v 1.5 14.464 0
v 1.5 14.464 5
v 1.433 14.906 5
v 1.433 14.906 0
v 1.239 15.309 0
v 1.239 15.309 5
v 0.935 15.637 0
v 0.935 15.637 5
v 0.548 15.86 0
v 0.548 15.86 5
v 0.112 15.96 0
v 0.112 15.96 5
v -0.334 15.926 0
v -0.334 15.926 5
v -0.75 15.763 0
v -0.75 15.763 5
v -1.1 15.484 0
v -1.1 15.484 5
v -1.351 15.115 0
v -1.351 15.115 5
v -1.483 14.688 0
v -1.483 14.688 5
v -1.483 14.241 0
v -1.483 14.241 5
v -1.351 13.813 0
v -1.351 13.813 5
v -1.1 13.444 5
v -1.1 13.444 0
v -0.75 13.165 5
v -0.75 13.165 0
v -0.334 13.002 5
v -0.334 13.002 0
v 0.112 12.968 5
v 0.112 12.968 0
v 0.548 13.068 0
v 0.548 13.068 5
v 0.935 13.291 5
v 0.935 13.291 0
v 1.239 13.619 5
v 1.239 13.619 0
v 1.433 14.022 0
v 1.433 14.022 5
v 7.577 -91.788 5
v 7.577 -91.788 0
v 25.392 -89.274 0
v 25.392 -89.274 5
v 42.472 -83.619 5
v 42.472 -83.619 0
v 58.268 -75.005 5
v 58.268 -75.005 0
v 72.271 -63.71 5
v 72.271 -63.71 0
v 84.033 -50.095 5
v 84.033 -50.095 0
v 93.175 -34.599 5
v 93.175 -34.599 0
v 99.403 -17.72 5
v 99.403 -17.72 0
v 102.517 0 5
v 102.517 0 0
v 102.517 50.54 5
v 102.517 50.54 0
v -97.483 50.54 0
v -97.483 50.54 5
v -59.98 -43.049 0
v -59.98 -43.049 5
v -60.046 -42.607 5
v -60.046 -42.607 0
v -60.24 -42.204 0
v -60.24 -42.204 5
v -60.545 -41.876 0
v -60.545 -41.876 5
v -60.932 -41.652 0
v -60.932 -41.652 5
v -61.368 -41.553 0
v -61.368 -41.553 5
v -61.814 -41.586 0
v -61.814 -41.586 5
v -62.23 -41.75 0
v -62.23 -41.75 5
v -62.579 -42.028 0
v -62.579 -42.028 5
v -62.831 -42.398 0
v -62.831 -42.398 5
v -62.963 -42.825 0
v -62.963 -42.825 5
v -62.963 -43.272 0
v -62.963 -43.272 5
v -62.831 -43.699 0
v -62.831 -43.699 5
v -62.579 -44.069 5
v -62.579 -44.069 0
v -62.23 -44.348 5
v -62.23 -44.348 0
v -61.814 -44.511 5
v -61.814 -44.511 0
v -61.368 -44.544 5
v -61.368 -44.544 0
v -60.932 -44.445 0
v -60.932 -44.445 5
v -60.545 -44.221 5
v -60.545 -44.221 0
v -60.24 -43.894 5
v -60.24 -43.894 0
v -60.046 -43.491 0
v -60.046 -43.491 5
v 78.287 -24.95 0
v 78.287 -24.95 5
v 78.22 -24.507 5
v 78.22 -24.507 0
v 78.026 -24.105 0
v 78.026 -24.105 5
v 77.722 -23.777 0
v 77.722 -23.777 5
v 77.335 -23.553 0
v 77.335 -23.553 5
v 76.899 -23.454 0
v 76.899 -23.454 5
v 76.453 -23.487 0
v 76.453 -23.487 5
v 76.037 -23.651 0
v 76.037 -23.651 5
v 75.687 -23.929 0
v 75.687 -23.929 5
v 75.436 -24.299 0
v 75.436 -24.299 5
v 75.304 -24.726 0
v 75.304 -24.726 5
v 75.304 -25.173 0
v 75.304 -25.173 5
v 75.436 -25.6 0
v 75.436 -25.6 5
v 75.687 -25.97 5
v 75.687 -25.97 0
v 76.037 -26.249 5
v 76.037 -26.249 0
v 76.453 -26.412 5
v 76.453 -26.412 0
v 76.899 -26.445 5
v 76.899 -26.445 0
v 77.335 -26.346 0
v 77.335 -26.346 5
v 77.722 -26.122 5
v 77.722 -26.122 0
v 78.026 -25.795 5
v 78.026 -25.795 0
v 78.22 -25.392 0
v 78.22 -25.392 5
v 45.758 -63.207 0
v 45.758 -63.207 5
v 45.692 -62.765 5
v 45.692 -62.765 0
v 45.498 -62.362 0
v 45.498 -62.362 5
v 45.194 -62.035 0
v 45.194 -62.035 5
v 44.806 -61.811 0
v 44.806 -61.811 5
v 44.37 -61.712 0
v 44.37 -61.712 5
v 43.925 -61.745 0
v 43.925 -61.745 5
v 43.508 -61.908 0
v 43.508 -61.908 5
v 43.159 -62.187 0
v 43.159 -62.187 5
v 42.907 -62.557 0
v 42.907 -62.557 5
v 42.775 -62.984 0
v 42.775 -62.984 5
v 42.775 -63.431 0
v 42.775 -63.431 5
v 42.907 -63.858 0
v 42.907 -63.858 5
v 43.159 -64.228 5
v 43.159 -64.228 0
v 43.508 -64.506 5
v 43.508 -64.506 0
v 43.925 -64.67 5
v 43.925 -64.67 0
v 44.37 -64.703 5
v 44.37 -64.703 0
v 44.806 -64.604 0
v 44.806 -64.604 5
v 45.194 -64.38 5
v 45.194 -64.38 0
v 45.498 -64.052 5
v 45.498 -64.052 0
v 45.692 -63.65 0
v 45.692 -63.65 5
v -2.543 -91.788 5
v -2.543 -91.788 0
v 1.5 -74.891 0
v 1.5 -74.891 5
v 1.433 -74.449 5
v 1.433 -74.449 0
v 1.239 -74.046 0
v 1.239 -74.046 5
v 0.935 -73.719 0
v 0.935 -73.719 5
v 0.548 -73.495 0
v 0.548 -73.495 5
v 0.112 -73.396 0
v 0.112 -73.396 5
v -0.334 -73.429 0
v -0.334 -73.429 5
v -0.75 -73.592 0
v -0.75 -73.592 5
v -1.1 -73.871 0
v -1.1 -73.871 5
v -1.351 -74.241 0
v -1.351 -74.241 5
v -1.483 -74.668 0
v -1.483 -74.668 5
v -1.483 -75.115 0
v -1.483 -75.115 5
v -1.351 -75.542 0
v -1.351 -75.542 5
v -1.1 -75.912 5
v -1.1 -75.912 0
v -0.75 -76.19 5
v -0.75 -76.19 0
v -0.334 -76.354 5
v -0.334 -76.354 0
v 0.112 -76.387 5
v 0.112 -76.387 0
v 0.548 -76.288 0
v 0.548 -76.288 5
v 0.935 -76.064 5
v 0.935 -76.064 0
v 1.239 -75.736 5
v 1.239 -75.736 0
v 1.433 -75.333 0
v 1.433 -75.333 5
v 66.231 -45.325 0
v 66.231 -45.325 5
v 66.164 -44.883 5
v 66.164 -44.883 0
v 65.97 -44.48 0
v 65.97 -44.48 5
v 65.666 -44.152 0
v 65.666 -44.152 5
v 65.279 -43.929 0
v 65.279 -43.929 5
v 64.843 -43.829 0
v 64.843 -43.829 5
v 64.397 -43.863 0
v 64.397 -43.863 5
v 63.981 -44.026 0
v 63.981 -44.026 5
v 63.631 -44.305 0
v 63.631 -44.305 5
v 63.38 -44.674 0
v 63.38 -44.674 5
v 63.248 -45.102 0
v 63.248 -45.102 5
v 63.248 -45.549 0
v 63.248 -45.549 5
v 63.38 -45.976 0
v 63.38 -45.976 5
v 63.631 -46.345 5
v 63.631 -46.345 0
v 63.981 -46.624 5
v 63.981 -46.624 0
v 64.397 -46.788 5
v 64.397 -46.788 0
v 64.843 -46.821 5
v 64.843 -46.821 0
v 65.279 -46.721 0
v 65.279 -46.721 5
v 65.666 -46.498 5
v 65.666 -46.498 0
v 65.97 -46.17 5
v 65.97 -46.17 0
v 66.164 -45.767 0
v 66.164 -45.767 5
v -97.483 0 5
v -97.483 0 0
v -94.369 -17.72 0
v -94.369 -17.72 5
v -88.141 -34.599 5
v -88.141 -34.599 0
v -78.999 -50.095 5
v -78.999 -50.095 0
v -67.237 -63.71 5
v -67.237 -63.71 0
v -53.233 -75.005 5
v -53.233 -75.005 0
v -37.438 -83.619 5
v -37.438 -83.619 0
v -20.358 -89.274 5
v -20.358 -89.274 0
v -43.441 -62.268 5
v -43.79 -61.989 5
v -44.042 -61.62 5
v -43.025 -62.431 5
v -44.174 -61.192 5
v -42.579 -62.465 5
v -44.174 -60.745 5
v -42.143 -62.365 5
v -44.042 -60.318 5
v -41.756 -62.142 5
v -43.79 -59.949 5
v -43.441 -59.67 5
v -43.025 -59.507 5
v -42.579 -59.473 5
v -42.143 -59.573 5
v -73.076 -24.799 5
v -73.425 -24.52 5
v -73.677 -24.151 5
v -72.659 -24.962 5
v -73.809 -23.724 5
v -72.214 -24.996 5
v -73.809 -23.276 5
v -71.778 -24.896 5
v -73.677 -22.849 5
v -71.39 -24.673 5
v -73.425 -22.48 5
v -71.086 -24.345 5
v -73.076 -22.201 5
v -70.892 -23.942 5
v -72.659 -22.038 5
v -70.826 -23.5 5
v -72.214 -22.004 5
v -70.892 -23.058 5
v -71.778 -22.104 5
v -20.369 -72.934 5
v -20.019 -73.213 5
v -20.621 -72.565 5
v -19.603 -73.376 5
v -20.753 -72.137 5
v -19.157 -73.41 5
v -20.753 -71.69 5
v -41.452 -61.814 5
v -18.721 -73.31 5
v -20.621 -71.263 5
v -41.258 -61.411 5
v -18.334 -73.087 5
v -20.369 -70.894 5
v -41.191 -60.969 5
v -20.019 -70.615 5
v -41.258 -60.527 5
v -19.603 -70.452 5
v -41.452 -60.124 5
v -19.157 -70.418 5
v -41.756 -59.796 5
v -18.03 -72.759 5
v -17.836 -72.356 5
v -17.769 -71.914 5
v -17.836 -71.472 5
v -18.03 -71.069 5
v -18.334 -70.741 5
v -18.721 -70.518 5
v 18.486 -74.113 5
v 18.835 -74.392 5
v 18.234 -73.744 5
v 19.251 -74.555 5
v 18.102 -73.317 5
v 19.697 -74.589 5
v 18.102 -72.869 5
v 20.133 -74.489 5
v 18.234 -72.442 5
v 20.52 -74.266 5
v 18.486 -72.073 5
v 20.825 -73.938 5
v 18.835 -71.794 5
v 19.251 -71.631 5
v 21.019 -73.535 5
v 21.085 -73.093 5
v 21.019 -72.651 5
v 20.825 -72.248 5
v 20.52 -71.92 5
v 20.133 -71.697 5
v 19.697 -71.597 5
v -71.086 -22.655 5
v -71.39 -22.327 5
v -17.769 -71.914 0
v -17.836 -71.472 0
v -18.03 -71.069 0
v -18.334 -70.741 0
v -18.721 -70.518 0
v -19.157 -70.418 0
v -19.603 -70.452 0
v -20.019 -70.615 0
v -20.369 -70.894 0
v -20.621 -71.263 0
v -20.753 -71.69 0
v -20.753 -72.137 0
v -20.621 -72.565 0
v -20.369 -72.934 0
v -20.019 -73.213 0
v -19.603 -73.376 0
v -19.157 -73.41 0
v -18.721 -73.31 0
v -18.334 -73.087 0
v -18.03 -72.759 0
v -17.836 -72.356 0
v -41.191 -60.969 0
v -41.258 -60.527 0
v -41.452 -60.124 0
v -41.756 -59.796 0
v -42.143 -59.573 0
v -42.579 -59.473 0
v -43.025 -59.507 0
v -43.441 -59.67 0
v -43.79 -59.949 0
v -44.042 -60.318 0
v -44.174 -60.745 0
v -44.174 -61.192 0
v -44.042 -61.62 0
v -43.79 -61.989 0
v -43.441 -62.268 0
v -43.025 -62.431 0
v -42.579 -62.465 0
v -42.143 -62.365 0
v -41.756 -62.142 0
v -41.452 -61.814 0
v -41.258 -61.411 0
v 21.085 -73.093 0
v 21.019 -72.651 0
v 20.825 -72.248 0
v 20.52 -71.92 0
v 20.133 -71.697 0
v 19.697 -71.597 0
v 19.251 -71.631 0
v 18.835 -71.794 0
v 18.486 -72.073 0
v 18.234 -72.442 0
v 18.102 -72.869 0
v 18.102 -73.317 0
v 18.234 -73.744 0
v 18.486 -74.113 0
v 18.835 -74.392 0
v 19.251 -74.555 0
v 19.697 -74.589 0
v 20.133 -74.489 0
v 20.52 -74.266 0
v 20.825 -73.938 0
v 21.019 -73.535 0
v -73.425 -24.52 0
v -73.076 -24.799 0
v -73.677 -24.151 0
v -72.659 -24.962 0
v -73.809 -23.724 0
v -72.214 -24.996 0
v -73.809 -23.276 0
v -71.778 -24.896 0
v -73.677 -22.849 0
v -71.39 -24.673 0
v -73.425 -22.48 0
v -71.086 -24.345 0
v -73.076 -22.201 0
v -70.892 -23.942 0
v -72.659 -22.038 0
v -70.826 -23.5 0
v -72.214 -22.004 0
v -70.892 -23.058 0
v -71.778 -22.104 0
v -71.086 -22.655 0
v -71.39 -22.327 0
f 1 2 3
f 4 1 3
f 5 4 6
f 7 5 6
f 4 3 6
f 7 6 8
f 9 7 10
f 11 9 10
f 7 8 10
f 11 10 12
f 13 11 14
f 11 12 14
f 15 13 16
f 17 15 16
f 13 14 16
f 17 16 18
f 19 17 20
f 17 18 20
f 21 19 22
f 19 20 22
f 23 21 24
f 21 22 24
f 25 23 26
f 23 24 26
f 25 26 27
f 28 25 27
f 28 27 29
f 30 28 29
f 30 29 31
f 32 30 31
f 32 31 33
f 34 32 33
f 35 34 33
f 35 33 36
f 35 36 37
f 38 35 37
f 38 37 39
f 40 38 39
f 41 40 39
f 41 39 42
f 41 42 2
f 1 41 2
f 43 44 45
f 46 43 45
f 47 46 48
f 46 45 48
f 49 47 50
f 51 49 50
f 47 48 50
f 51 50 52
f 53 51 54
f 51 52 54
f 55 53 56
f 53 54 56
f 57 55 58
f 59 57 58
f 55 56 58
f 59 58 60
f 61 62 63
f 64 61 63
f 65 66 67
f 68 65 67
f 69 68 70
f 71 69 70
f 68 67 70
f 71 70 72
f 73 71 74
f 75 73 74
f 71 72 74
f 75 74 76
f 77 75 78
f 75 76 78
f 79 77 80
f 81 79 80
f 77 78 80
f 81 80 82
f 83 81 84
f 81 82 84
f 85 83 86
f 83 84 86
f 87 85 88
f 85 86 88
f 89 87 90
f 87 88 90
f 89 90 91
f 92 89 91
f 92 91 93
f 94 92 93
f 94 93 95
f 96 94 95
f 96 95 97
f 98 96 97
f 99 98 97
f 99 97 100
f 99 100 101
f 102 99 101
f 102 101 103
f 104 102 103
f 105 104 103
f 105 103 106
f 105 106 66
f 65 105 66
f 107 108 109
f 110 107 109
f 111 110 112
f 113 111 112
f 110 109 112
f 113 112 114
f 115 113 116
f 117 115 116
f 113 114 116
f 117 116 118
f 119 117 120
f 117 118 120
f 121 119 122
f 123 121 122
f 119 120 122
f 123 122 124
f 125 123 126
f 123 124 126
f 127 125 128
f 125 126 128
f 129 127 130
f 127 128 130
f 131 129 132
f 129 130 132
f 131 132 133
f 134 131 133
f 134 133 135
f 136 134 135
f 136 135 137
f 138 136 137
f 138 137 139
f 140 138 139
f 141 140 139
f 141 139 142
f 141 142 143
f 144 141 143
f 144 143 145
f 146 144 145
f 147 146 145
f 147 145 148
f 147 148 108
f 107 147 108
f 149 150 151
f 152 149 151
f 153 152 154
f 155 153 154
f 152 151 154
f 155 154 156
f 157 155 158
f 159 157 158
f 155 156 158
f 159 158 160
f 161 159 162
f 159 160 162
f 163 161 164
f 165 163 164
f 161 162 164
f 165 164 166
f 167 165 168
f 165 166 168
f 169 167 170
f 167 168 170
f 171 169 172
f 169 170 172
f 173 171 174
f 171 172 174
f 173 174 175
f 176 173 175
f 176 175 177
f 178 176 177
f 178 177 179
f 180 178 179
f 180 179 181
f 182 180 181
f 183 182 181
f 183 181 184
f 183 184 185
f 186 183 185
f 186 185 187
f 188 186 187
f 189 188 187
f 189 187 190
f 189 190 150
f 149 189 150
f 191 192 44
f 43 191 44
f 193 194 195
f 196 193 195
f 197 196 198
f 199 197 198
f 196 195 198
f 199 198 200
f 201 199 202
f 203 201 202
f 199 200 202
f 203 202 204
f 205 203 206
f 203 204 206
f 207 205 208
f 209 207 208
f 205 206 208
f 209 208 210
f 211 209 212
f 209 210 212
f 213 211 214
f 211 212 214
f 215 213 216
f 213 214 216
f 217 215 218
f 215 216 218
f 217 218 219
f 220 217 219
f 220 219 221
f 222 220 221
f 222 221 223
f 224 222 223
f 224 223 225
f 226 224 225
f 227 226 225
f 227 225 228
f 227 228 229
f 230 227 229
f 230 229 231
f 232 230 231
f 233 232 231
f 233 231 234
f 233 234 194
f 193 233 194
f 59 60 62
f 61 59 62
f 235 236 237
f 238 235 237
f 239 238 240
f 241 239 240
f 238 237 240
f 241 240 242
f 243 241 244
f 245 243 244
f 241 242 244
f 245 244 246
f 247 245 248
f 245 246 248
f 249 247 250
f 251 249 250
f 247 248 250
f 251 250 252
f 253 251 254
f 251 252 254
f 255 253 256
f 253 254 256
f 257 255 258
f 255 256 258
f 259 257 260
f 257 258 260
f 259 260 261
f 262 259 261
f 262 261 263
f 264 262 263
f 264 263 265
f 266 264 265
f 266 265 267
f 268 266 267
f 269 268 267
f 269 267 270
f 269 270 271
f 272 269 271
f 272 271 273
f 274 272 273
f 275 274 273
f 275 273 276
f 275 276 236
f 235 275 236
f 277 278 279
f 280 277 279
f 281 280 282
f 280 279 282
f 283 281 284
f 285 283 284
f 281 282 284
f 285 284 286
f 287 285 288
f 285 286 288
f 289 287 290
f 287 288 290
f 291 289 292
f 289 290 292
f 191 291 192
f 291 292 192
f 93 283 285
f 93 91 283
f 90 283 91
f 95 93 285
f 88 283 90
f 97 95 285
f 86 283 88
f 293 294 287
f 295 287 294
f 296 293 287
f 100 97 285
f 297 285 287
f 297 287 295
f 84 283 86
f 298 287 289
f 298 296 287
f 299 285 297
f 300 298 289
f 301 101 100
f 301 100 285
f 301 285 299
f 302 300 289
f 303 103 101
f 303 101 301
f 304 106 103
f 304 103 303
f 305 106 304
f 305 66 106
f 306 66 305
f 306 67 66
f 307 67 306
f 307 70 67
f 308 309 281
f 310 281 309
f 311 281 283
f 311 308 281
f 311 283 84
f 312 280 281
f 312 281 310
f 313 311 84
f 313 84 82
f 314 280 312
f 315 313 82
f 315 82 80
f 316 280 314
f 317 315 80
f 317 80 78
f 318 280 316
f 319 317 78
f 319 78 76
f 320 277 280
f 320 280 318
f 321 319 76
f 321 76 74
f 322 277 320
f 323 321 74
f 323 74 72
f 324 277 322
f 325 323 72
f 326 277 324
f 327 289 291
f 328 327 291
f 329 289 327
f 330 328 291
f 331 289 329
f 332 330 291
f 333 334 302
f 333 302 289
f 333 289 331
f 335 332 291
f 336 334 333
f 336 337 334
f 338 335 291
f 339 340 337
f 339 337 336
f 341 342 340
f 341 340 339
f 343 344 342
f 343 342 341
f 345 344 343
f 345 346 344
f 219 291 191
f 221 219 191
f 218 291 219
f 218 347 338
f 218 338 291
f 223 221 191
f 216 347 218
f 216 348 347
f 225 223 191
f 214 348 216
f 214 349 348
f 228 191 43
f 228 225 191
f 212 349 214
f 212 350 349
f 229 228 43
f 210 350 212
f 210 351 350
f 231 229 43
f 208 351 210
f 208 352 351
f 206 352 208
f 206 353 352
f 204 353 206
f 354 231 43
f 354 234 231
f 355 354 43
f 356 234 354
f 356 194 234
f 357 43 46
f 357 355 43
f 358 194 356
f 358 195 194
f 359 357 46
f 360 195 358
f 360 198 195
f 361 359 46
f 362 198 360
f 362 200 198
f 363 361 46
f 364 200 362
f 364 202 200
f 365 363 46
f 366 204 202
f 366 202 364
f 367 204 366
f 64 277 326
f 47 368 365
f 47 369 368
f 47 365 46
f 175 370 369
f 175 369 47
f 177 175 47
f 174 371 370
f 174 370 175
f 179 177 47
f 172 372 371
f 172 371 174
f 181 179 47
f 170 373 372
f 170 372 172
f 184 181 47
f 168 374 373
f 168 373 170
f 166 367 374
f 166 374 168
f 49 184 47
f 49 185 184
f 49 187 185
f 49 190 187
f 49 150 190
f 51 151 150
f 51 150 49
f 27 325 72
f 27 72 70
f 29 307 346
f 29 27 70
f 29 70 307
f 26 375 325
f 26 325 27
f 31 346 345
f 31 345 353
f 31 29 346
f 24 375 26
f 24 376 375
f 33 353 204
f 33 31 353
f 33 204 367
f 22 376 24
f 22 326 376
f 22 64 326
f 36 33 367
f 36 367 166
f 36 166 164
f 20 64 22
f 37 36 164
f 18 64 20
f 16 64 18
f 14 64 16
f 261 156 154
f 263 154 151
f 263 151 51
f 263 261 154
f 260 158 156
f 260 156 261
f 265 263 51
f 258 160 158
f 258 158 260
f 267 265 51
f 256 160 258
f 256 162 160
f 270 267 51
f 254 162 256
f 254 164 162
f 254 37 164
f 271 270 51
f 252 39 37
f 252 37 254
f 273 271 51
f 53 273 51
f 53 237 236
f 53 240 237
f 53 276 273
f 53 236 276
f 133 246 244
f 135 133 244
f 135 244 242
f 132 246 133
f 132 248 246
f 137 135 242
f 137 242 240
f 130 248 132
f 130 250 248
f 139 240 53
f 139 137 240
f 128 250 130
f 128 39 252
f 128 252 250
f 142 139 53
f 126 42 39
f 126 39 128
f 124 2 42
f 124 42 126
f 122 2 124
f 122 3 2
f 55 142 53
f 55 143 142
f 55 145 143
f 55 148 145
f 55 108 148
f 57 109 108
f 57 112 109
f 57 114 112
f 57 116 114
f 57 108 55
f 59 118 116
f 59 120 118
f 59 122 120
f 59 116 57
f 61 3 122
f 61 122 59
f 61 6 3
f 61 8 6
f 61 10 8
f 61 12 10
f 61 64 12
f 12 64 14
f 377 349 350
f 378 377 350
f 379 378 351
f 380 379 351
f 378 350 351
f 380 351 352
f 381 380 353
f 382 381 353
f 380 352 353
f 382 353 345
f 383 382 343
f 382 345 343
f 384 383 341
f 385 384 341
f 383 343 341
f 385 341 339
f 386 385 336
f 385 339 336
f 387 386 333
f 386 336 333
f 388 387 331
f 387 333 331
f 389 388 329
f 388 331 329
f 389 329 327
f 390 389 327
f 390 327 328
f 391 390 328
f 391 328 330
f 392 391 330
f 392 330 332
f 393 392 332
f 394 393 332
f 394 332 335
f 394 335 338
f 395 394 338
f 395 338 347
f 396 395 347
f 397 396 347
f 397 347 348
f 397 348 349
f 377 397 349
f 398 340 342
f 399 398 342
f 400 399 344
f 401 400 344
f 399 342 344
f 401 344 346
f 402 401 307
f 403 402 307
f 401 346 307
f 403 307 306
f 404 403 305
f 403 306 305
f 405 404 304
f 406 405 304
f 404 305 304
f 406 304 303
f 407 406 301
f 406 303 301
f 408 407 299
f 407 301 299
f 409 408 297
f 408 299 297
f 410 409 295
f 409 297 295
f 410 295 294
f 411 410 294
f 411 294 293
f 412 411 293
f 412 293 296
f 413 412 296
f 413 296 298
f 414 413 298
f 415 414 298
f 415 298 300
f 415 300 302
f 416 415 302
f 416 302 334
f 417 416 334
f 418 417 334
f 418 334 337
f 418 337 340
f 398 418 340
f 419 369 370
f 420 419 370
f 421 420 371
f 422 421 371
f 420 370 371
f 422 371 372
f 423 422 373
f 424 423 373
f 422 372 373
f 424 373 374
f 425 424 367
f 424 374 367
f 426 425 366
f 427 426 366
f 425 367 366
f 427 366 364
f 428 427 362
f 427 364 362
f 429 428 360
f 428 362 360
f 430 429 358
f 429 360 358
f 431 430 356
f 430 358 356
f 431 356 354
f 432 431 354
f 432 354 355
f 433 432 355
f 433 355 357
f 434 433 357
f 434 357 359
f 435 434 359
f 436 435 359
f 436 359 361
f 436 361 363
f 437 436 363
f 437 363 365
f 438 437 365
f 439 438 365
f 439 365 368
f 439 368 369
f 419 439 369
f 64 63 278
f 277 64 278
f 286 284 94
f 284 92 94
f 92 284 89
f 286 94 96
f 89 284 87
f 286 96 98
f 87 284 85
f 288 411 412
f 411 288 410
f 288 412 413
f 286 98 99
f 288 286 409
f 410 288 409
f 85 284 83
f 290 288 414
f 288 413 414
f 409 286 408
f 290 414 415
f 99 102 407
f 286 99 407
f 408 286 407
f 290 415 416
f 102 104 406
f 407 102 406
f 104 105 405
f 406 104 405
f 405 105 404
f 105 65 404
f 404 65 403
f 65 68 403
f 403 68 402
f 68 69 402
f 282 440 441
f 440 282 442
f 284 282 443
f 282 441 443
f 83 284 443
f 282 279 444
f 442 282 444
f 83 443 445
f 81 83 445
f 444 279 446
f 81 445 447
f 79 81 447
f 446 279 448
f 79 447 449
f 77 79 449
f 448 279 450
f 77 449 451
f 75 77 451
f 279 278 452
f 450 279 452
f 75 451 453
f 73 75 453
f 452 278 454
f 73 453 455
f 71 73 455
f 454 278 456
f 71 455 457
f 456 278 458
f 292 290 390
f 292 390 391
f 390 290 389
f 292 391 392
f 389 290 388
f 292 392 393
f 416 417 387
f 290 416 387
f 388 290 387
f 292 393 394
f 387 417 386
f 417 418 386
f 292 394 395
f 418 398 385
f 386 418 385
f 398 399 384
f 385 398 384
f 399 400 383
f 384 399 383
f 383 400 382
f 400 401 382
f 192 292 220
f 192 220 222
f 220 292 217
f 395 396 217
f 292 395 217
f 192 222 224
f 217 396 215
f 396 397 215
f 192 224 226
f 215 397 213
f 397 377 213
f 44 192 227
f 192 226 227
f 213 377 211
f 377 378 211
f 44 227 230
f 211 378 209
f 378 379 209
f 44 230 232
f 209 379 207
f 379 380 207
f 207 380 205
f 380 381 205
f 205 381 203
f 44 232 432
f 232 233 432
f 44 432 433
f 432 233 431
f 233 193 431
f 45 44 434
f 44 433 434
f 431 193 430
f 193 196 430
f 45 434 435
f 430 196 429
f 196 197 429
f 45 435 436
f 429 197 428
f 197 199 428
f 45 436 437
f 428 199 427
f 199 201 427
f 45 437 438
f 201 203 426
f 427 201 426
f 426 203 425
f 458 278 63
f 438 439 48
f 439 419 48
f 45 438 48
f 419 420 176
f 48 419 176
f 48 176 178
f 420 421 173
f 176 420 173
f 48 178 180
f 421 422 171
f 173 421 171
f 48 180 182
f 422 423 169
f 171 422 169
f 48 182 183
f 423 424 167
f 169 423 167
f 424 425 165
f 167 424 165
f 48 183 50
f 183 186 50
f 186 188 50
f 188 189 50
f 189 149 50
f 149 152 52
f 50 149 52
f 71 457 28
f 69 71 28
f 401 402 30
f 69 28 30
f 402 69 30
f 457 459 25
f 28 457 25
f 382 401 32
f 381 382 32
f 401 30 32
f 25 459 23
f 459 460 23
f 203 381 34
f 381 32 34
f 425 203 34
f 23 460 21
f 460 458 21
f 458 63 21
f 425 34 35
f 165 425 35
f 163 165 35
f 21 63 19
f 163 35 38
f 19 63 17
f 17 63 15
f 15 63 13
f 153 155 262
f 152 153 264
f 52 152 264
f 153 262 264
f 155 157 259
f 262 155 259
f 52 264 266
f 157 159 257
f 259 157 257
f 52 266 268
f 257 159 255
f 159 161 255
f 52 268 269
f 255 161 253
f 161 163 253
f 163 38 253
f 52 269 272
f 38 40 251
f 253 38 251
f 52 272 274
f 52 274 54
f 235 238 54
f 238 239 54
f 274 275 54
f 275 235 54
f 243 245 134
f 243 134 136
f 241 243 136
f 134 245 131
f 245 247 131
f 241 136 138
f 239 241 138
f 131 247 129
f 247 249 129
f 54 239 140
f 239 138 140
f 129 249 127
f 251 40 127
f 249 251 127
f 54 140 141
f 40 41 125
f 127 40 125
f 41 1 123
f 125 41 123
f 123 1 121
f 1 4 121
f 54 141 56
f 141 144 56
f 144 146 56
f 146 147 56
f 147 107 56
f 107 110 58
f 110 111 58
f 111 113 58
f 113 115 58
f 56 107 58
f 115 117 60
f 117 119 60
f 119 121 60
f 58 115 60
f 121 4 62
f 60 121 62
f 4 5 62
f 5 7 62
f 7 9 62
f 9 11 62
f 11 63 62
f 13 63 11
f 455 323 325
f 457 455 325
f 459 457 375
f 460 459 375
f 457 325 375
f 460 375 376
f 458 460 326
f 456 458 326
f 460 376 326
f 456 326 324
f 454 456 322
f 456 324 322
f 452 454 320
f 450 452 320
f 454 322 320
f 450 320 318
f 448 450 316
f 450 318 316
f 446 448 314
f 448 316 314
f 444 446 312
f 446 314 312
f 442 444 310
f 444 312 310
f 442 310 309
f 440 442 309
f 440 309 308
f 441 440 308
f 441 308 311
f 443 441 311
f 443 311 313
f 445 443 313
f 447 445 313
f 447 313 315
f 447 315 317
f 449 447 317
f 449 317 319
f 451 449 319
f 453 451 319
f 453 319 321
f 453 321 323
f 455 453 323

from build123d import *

# Parameters (mm, degrees)
F1_DEPTH = 5
F2_R     = 1.5
F3_DEPTH = 25


# Not quite as in the source:
# - a feature names something its author has since deleted; it is built from what else it names


with BuildPart() as f1:
    # F0 (on Top) → F1 (new body)
    with BuildSketch(Plane.XY):
        with BuildLine():
            ThreePointArc((-97.4828772247, 0), (-67.2370800722, -63.7098067384), (-2.5426874445, -91.7879705417))
            Line((-2.5426874445, -91.7879705417), (7.5769329952, -91.7879705417))
            ThreePointArc((7.5769329952, -91.7879705417), (72.2713256229, -63.7098067384), (102.5171227753, 0))
            Line((102.5171227753, 0), (102.5171227753, 50.5402684212))
            Line((102.5171227753, 50.5402684212), (-97.4828772247, 50.5402684212))
            Line((-97.4828772247, 50.5402684212), (-97.4828772247, 0))
        make_face()
    extrude(amount=F1_DEPTH)

    # F2 (on face) → F3 (cut)
    with BuildSketch(Plane.XY.offset(5)):
        with Locations((-72.3256510152, -23.5000285577)):
            Circle(F2_R)
        with Locations((-61.4798521783, -43.0486559433)):
            Circle(F2_R)
        with Locations((-42.6908970166, -60.9689194803)):
            Circle(F2_R)
        with Locations((-19.2692746164, -71.9139118934)):
            Circle(F2_R)
        with Locations((0, -74.8913536115)):
            Circle(F2_R)
        with Locations((19.5851995713, -73.0929598765)):
            Circle(F2_R)
        with Locations((44.2583380034, -63.2074572013)):
            Circle(F2_R)
        with Locations((64.7310261921, -45.3251524957)):
            Circle(F2_R)
        with Locations((76.7870070898, -24.9496110183)):
            Circle(F2_R)
        with Locations((0, 14.4641017541)):
            Circle(F2_R)
    extrude(amount=-F3_DEPTH, mode=Mode.SUBTRACT)


solid = f1.part
